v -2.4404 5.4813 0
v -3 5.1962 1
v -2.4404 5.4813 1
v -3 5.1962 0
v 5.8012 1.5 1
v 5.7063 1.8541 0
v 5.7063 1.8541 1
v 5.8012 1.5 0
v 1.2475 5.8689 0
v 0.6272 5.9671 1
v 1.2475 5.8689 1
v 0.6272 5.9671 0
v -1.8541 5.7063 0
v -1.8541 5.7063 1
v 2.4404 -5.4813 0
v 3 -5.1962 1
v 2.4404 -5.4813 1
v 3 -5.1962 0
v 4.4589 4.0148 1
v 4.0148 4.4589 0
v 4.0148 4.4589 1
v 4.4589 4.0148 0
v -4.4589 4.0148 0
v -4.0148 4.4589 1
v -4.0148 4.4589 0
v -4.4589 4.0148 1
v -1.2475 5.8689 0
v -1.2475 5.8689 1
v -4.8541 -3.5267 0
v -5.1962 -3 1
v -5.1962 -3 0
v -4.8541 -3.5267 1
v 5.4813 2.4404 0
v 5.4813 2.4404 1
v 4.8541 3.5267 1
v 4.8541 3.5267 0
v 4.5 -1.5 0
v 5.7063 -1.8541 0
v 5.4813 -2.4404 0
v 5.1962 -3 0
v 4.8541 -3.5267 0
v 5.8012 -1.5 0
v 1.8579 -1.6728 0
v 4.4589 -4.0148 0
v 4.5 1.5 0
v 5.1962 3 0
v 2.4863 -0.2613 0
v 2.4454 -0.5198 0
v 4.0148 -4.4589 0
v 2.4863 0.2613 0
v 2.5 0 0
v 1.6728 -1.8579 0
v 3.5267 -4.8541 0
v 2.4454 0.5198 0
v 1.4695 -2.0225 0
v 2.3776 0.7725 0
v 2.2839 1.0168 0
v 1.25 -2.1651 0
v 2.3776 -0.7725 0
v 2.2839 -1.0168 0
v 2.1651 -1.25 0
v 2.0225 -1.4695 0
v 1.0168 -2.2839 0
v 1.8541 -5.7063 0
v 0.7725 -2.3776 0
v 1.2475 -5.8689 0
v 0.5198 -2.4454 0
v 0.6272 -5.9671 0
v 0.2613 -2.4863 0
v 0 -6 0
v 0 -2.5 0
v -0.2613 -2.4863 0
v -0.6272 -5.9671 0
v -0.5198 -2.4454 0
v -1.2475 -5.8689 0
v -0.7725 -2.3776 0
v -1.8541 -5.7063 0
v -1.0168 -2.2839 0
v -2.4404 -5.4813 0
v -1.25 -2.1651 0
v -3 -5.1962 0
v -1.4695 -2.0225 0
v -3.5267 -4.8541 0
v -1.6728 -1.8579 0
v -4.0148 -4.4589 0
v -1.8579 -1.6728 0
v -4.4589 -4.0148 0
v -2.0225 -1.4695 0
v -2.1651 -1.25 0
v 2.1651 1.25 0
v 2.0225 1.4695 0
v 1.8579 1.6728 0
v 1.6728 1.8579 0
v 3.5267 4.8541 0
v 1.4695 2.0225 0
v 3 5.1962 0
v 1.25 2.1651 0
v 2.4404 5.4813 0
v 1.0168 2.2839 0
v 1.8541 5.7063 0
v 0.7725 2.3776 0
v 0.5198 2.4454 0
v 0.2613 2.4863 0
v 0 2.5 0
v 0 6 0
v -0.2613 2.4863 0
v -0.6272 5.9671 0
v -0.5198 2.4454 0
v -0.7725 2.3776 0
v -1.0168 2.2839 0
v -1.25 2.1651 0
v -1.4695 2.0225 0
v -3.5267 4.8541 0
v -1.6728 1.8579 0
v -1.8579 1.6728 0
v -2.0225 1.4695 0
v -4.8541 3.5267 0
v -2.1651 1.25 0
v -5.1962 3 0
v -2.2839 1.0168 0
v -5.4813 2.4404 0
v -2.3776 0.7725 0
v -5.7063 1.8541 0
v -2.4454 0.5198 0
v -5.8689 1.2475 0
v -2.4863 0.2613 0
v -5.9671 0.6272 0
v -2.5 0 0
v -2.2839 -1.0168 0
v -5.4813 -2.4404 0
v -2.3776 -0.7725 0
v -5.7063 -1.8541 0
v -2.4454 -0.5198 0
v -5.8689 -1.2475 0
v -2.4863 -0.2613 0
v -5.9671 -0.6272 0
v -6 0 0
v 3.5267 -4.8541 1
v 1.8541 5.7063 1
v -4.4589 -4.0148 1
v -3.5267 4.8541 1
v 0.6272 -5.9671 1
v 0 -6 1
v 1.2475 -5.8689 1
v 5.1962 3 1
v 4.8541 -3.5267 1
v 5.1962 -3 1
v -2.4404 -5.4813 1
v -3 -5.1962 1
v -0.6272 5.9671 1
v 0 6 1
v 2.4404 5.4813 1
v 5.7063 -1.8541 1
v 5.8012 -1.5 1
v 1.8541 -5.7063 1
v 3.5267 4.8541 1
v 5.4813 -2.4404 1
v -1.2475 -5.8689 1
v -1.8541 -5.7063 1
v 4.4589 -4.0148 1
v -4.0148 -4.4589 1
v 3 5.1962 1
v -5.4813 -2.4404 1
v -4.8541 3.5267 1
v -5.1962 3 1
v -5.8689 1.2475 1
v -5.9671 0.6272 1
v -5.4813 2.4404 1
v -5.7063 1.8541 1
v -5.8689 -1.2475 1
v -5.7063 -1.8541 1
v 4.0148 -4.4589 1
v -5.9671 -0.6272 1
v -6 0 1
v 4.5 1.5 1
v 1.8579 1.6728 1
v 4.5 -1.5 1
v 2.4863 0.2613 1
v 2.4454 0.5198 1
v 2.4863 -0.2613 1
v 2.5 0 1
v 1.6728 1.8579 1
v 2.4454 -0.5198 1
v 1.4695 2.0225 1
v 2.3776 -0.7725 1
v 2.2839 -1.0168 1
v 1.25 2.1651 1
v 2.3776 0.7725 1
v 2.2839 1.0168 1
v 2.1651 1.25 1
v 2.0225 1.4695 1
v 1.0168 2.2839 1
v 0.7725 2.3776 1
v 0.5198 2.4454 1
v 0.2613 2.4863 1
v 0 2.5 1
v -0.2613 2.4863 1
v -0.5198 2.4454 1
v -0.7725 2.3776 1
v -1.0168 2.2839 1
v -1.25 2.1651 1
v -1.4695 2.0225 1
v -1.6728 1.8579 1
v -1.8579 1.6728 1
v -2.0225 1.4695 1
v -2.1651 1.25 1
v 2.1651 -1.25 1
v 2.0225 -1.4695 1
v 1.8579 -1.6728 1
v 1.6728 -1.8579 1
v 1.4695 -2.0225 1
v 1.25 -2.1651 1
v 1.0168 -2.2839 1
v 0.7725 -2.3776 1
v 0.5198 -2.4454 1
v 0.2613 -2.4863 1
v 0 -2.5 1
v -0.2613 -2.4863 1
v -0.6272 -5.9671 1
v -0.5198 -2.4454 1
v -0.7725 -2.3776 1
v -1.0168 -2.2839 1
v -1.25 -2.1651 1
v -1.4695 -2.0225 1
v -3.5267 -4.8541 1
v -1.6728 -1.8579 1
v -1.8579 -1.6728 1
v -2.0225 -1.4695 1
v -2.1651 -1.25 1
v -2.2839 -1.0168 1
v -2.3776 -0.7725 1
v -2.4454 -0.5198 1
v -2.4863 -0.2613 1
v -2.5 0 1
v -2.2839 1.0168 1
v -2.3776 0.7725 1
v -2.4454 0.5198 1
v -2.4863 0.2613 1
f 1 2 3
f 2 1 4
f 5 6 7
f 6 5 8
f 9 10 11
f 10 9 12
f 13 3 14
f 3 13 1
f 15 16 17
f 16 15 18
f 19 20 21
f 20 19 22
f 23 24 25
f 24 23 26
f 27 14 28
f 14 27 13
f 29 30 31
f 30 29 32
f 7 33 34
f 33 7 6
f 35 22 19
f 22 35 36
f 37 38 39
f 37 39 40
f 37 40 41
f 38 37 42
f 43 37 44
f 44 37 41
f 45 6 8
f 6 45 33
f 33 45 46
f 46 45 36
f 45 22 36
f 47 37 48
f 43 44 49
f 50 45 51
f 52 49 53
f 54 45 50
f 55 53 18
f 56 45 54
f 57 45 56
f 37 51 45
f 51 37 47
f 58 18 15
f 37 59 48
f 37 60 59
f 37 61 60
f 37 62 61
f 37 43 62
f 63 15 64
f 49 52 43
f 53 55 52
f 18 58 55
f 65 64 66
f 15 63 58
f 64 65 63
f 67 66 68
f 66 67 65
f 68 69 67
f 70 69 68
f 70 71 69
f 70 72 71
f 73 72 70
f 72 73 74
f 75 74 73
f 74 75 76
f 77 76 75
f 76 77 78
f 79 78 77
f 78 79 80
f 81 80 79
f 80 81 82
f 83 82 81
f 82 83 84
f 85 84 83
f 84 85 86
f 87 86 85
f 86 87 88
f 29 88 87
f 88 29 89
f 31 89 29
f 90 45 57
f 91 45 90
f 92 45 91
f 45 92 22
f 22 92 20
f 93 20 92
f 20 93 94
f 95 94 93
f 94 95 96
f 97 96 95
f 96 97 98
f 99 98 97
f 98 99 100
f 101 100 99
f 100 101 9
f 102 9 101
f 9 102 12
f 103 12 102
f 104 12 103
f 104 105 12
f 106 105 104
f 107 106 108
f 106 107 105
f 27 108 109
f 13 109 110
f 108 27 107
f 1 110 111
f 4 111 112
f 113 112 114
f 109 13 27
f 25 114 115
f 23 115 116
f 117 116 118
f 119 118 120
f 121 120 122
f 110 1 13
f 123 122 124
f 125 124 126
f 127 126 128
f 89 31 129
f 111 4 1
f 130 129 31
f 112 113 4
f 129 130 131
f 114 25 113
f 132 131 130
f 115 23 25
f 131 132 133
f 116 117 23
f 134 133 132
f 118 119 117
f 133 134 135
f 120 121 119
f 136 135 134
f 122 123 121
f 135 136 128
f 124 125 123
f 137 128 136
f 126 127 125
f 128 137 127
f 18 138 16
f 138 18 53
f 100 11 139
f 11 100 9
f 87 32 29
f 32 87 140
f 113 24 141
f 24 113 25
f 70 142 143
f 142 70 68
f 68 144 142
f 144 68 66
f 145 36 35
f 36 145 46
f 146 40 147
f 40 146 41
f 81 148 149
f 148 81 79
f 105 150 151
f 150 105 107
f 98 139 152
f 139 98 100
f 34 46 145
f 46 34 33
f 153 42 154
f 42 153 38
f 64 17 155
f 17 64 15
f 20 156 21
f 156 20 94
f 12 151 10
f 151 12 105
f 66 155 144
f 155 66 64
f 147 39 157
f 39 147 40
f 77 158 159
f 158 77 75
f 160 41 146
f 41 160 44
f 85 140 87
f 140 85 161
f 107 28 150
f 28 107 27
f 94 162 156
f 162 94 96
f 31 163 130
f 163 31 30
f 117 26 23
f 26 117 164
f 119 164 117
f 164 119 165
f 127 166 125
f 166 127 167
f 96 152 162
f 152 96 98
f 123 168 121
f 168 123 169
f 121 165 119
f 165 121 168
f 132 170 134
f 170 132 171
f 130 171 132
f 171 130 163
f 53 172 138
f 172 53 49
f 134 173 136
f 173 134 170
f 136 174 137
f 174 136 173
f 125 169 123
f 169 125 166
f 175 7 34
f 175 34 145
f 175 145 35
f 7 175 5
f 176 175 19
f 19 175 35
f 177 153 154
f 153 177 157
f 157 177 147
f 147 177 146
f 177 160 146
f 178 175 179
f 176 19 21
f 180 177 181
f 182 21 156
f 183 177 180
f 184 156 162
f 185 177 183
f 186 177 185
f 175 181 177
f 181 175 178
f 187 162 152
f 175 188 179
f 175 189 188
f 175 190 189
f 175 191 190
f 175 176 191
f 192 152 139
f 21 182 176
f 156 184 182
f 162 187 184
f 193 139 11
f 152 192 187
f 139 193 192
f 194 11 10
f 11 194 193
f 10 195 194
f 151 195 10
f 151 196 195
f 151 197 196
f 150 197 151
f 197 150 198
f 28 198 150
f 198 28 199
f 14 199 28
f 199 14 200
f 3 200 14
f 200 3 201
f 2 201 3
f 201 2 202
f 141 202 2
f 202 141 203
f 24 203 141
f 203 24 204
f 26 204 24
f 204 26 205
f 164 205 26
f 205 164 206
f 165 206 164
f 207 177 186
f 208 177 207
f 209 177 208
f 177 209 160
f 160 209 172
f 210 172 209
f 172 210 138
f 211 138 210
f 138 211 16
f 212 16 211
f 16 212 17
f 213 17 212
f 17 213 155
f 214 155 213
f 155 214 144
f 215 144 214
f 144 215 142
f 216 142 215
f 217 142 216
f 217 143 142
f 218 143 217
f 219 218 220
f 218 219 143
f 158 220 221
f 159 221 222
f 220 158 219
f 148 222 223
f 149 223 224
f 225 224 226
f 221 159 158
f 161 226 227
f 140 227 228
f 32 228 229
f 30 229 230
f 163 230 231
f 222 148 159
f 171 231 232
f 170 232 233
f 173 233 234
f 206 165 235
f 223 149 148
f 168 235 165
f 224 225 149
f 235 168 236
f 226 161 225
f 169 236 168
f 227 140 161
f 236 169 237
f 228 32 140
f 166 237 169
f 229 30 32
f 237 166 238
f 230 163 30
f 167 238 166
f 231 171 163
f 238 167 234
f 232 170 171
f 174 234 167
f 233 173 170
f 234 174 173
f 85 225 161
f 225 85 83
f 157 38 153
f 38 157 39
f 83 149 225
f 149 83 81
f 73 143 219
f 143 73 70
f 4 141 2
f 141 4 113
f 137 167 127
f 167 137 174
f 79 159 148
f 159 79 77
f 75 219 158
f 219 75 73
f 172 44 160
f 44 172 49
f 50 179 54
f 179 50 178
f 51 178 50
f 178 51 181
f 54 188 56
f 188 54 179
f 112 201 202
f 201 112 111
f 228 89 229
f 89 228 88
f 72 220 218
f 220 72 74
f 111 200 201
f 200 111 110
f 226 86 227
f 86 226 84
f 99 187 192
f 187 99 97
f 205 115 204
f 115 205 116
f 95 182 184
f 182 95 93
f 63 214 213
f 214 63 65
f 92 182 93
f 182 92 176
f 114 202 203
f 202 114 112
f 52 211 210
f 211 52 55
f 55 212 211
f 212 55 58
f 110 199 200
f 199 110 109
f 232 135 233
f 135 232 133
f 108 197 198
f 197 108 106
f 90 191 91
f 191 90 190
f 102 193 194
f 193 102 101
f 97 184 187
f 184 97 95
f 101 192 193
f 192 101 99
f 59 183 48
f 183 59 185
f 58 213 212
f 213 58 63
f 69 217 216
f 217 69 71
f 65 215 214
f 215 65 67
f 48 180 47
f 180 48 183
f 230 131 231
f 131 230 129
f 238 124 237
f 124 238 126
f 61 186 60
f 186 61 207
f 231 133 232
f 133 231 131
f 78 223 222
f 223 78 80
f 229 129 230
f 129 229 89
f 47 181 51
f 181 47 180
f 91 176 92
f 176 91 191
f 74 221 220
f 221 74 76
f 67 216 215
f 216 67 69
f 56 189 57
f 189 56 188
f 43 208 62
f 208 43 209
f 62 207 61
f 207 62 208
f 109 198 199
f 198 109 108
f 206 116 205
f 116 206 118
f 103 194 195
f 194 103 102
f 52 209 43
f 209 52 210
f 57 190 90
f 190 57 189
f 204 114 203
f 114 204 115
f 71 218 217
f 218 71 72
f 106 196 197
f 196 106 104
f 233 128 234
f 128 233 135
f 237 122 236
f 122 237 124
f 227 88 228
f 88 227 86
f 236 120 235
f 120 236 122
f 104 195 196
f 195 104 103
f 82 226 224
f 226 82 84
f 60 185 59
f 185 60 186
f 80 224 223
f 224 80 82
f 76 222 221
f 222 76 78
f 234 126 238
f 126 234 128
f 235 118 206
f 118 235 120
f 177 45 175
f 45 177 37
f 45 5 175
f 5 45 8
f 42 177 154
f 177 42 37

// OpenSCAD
// External retaining ring with installation gap.
$fn = 60;
eps = 0.02;
shaft_d = 5;
outer_d = 12;
thickness = 1;
gap = 3;
difference() {
    cylinder(d = outer_d, h = thickness);
    translate([0, 0, -eps]) cylinder(d = shaft_d, h = thickness + 2 * eps);
    translate([outer_d / 2 - gap / 2, -gap / 2, -eps]) cube([gap + eps, gap, thickness + 2 * eps]);
}
